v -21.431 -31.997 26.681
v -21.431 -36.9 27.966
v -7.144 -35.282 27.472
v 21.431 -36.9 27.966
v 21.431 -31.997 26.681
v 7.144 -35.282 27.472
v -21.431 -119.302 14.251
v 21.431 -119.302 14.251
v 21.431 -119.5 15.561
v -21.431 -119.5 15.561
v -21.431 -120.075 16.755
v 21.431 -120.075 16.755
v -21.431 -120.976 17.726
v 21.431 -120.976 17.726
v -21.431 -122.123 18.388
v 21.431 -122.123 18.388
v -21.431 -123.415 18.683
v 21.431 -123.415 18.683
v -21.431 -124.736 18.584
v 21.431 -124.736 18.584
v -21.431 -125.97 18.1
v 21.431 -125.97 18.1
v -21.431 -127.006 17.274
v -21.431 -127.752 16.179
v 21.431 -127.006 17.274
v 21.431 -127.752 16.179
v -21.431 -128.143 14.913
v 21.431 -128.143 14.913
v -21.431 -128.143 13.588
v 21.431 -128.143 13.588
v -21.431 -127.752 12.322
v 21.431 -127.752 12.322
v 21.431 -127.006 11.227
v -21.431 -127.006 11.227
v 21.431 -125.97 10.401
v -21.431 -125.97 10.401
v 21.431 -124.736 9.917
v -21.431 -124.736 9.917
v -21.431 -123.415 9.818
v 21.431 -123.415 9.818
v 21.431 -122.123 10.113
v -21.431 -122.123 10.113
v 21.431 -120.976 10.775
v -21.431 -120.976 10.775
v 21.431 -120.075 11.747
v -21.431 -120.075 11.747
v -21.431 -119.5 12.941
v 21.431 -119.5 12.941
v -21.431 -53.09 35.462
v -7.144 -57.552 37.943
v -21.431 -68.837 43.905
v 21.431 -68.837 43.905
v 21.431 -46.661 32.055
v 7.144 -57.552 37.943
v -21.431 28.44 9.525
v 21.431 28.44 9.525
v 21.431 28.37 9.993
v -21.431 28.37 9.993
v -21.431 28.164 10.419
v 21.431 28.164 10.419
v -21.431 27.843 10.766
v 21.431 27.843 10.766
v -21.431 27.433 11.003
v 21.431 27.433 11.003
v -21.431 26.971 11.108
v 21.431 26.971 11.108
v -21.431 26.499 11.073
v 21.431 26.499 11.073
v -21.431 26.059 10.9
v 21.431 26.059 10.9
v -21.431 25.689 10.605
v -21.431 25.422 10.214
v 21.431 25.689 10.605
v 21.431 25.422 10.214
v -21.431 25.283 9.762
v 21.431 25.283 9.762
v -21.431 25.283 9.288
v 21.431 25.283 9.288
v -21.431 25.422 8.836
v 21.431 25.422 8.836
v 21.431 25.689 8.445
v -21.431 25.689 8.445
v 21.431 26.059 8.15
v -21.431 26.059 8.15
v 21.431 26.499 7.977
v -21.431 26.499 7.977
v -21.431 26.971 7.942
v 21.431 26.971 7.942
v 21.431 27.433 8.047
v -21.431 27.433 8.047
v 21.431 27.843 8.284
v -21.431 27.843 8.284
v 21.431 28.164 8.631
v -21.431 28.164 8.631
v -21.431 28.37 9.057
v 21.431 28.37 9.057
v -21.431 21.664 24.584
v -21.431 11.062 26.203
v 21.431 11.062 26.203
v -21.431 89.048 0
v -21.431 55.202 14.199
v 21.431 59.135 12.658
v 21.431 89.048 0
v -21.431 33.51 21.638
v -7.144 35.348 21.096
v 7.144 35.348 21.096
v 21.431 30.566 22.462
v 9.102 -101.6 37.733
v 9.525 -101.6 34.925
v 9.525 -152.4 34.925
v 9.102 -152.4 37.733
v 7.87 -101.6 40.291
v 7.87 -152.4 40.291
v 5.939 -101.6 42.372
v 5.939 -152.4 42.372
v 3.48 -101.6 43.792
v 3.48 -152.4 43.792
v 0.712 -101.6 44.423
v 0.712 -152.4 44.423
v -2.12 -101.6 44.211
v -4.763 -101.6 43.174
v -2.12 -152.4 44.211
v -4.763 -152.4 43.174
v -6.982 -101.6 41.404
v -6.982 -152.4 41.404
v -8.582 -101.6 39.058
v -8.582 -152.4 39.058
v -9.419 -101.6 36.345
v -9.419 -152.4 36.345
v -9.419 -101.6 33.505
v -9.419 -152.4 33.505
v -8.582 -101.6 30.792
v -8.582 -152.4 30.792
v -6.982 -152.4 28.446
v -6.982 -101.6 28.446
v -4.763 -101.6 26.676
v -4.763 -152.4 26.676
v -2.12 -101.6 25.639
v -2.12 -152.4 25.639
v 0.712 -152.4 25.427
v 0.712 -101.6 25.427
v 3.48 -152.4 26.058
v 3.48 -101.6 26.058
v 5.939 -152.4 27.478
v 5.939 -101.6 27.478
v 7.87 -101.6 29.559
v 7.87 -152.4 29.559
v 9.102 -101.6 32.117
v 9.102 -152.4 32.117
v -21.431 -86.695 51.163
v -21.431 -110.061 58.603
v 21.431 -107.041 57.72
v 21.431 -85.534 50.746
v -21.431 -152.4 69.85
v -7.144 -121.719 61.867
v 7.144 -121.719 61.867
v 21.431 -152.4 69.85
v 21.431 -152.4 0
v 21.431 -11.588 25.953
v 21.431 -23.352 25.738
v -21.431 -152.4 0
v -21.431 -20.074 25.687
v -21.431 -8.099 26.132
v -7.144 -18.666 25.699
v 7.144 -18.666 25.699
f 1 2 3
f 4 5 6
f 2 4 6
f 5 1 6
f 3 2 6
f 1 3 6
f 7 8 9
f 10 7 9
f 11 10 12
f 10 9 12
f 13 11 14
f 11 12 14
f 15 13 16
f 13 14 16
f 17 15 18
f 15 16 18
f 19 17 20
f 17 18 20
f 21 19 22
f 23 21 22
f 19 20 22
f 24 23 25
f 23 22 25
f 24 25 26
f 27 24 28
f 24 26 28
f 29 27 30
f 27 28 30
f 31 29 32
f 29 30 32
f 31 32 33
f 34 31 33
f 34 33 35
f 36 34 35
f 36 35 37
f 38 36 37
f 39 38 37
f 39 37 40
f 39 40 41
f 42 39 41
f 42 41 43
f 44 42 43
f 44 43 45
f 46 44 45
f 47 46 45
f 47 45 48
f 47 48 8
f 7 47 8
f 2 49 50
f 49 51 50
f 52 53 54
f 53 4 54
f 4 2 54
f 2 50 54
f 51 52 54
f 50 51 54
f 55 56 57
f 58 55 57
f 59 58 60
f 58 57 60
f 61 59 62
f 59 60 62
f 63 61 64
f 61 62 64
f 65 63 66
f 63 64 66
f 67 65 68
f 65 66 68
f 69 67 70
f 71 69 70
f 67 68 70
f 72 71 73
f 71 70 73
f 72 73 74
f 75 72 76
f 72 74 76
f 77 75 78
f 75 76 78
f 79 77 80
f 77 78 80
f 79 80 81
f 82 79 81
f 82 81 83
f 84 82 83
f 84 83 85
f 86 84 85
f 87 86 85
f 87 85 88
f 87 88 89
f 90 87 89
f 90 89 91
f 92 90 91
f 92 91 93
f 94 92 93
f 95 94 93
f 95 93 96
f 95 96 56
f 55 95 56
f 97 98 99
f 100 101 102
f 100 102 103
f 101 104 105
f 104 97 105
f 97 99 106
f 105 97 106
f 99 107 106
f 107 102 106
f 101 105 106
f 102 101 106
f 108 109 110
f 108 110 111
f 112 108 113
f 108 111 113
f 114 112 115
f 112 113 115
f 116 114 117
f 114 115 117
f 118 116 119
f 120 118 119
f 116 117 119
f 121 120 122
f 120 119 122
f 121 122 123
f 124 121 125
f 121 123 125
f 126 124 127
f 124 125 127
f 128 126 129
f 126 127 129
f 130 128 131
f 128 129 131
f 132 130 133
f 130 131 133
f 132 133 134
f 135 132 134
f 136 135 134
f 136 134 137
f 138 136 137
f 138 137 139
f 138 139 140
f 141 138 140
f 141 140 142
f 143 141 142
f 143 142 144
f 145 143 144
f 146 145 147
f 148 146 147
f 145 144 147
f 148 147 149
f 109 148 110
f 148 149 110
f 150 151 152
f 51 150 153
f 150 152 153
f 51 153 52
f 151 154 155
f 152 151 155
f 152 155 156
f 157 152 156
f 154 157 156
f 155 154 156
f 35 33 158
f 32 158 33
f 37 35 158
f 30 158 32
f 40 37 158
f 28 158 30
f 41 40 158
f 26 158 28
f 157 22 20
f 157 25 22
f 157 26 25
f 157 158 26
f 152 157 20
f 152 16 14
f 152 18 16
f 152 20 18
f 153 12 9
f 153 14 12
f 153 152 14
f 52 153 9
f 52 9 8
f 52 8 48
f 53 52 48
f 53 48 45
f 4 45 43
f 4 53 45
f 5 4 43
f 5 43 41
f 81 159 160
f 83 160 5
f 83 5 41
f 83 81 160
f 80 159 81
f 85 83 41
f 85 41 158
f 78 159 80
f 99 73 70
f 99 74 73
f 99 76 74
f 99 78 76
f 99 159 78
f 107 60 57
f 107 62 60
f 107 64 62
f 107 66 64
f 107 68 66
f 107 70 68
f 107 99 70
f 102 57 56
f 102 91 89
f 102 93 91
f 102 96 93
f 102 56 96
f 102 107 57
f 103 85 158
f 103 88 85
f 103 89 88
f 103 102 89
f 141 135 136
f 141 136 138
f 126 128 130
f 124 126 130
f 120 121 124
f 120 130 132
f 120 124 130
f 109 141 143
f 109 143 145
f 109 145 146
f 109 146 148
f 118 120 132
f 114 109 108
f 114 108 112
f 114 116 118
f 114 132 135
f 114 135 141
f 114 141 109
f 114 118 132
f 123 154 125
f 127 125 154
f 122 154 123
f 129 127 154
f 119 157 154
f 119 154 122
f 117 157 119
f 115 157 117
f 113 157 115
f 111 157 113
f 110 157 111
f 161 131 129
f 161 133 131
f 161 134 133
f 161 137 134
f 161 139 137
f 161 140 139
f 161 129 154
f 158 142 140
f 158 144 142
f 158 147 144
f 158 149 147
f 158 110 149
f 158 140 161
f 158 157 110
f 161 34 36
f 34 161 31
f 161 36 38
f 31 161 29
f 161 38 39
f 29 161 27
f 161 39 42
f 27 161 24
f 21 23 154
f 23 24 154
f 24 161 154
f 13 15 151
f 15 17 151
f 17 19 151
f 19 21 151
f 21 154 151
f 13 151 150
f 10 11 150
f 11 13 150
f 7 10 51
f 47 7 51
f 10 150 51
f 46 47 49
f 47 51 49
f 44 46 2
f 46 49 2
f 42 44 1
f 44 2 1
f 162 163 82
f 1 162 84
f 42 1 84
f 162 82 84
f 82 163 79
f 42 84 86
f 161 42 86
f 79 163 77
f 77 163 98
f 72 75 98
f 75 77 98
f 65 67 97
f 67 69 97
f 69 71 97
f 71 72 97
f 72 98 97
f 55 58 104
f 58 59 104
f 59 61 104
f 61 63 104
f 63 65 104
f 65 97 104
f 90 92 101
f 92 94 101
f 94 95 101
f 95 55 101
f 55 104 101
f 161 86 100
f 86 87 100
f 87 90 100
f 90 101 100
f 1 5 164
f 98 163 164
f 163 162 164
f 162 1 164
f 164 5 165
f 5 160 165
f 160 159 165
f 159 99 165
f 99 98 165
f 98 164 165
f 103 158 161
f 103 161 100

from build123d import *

# Parameters (mm, degrees)
F1_DEPTH = 21.43125
F2_R     = 9.525
F3_DEPTH = 50.8
F4_R     = 4.445
F4_R_2   = 1.5875
F5_DEPTH = 42.8635


with BuildPart() as f1:
    # F0 (on Right) → F1 (new body, symmetric)
    with BuildSketch(Plane.YZ):
        Polygon((-152.4, 69.85), (-152.4, 0), (152.4, 0), (152.4, 19.05), align=None)
    extrude(amount=F1_DEPTH, both=True)

    # F2 (on face) → F3 (cut)
    with BuildSketch(Plane.XZ.offset(152.4)):
        with Locations((0, 34.925)):
            Circle(F2_R)
    extrude(amount=-F3_DEPTH, mode=Mode.SUBTRACT)

    # F4 (on face) → F5 (intersect, through all)
    with BuildSketch(Plane.YZ.offset(21.43125)):
        with BuildLine():
            add(Edge.make_bspline(
                [(-152.4, 69.85), (-121.3656988164, 61.9505317028), (-90.3313976582, 54.0510634121), (-68.8373446816, 43.905343877)],
                knots=[0, 0, 0, 0, 0.298244377, 0.298244377, 0.298244377, 0.298244377], degree=3))
            Line((-152.4, 69.85), (-152.4, 0))
            Line((-152.4, 0), (89.0480875969, 0))
            add(Edge.make_bspline(
                [(11.0622523739, 26.2030381672), (33.9802557949, 23.9980037311), (61.5141716843, 11.9990018706), (89.0480875969, 0)],
                knots=[0.7108019534, 0.7108019534, 0.7108019534, 0.7108019534, 1, 1, 1, 1], degree=3))
            add(Edge.make_bspline(
                [(-31.9974124432, 26.681477204), (-19.2539773306, 24.1221974468), (-4.6688570157, 27.4575486936), (11.0622523353, 26.2030381709)],
                knots=[0.5026616476, 0.5026616476, 0.5026616476, 0.5026616476, 0.67191681, 0.67191681, 0.67191681, 0.67191681], degree=3))
            add(Edge.make_bspline(
                [(-36.899590382, 27.9662974151), (-35.2882031733, 27.4415892282), (-33.6596662635, 27.0073672393), (-31.9974124719, 26.6814772096)],
                knots=[0.4733294563, 0.4733294563, 0.4733294563, 0.4733294563, 0.501572538, 0.501572538, 0.501572538, 0.501572538], degree=3))
            add(Edge.make_bspline(
                [(-68.8373446465, 43.9053438604), (-56.8790512682, 38.1190372354), (-47.2945707385, 31.3048888776), (-36.899590382, 27.9662974151)],
                knots=[0.3381802775, 0.3381802775, 0.3381802775, 0.3381802775, 0.4805951467, 0.4805951467, 0.4805951467, 0.4805951467], degree=3))
        make_face()
        with Locations((-123.747177422, 14.2507199198)):
            Circle(F4_R, mode=Mode.SUBTRACT)
        with Locations((26.8527399749, 9.525)):
            Circle(F4_R_2, mode=Mode.SUBTRACT)
    extrude(amount=-F5_DEPTH, mode=Mode.INTERSECT)


solid = f1.part
